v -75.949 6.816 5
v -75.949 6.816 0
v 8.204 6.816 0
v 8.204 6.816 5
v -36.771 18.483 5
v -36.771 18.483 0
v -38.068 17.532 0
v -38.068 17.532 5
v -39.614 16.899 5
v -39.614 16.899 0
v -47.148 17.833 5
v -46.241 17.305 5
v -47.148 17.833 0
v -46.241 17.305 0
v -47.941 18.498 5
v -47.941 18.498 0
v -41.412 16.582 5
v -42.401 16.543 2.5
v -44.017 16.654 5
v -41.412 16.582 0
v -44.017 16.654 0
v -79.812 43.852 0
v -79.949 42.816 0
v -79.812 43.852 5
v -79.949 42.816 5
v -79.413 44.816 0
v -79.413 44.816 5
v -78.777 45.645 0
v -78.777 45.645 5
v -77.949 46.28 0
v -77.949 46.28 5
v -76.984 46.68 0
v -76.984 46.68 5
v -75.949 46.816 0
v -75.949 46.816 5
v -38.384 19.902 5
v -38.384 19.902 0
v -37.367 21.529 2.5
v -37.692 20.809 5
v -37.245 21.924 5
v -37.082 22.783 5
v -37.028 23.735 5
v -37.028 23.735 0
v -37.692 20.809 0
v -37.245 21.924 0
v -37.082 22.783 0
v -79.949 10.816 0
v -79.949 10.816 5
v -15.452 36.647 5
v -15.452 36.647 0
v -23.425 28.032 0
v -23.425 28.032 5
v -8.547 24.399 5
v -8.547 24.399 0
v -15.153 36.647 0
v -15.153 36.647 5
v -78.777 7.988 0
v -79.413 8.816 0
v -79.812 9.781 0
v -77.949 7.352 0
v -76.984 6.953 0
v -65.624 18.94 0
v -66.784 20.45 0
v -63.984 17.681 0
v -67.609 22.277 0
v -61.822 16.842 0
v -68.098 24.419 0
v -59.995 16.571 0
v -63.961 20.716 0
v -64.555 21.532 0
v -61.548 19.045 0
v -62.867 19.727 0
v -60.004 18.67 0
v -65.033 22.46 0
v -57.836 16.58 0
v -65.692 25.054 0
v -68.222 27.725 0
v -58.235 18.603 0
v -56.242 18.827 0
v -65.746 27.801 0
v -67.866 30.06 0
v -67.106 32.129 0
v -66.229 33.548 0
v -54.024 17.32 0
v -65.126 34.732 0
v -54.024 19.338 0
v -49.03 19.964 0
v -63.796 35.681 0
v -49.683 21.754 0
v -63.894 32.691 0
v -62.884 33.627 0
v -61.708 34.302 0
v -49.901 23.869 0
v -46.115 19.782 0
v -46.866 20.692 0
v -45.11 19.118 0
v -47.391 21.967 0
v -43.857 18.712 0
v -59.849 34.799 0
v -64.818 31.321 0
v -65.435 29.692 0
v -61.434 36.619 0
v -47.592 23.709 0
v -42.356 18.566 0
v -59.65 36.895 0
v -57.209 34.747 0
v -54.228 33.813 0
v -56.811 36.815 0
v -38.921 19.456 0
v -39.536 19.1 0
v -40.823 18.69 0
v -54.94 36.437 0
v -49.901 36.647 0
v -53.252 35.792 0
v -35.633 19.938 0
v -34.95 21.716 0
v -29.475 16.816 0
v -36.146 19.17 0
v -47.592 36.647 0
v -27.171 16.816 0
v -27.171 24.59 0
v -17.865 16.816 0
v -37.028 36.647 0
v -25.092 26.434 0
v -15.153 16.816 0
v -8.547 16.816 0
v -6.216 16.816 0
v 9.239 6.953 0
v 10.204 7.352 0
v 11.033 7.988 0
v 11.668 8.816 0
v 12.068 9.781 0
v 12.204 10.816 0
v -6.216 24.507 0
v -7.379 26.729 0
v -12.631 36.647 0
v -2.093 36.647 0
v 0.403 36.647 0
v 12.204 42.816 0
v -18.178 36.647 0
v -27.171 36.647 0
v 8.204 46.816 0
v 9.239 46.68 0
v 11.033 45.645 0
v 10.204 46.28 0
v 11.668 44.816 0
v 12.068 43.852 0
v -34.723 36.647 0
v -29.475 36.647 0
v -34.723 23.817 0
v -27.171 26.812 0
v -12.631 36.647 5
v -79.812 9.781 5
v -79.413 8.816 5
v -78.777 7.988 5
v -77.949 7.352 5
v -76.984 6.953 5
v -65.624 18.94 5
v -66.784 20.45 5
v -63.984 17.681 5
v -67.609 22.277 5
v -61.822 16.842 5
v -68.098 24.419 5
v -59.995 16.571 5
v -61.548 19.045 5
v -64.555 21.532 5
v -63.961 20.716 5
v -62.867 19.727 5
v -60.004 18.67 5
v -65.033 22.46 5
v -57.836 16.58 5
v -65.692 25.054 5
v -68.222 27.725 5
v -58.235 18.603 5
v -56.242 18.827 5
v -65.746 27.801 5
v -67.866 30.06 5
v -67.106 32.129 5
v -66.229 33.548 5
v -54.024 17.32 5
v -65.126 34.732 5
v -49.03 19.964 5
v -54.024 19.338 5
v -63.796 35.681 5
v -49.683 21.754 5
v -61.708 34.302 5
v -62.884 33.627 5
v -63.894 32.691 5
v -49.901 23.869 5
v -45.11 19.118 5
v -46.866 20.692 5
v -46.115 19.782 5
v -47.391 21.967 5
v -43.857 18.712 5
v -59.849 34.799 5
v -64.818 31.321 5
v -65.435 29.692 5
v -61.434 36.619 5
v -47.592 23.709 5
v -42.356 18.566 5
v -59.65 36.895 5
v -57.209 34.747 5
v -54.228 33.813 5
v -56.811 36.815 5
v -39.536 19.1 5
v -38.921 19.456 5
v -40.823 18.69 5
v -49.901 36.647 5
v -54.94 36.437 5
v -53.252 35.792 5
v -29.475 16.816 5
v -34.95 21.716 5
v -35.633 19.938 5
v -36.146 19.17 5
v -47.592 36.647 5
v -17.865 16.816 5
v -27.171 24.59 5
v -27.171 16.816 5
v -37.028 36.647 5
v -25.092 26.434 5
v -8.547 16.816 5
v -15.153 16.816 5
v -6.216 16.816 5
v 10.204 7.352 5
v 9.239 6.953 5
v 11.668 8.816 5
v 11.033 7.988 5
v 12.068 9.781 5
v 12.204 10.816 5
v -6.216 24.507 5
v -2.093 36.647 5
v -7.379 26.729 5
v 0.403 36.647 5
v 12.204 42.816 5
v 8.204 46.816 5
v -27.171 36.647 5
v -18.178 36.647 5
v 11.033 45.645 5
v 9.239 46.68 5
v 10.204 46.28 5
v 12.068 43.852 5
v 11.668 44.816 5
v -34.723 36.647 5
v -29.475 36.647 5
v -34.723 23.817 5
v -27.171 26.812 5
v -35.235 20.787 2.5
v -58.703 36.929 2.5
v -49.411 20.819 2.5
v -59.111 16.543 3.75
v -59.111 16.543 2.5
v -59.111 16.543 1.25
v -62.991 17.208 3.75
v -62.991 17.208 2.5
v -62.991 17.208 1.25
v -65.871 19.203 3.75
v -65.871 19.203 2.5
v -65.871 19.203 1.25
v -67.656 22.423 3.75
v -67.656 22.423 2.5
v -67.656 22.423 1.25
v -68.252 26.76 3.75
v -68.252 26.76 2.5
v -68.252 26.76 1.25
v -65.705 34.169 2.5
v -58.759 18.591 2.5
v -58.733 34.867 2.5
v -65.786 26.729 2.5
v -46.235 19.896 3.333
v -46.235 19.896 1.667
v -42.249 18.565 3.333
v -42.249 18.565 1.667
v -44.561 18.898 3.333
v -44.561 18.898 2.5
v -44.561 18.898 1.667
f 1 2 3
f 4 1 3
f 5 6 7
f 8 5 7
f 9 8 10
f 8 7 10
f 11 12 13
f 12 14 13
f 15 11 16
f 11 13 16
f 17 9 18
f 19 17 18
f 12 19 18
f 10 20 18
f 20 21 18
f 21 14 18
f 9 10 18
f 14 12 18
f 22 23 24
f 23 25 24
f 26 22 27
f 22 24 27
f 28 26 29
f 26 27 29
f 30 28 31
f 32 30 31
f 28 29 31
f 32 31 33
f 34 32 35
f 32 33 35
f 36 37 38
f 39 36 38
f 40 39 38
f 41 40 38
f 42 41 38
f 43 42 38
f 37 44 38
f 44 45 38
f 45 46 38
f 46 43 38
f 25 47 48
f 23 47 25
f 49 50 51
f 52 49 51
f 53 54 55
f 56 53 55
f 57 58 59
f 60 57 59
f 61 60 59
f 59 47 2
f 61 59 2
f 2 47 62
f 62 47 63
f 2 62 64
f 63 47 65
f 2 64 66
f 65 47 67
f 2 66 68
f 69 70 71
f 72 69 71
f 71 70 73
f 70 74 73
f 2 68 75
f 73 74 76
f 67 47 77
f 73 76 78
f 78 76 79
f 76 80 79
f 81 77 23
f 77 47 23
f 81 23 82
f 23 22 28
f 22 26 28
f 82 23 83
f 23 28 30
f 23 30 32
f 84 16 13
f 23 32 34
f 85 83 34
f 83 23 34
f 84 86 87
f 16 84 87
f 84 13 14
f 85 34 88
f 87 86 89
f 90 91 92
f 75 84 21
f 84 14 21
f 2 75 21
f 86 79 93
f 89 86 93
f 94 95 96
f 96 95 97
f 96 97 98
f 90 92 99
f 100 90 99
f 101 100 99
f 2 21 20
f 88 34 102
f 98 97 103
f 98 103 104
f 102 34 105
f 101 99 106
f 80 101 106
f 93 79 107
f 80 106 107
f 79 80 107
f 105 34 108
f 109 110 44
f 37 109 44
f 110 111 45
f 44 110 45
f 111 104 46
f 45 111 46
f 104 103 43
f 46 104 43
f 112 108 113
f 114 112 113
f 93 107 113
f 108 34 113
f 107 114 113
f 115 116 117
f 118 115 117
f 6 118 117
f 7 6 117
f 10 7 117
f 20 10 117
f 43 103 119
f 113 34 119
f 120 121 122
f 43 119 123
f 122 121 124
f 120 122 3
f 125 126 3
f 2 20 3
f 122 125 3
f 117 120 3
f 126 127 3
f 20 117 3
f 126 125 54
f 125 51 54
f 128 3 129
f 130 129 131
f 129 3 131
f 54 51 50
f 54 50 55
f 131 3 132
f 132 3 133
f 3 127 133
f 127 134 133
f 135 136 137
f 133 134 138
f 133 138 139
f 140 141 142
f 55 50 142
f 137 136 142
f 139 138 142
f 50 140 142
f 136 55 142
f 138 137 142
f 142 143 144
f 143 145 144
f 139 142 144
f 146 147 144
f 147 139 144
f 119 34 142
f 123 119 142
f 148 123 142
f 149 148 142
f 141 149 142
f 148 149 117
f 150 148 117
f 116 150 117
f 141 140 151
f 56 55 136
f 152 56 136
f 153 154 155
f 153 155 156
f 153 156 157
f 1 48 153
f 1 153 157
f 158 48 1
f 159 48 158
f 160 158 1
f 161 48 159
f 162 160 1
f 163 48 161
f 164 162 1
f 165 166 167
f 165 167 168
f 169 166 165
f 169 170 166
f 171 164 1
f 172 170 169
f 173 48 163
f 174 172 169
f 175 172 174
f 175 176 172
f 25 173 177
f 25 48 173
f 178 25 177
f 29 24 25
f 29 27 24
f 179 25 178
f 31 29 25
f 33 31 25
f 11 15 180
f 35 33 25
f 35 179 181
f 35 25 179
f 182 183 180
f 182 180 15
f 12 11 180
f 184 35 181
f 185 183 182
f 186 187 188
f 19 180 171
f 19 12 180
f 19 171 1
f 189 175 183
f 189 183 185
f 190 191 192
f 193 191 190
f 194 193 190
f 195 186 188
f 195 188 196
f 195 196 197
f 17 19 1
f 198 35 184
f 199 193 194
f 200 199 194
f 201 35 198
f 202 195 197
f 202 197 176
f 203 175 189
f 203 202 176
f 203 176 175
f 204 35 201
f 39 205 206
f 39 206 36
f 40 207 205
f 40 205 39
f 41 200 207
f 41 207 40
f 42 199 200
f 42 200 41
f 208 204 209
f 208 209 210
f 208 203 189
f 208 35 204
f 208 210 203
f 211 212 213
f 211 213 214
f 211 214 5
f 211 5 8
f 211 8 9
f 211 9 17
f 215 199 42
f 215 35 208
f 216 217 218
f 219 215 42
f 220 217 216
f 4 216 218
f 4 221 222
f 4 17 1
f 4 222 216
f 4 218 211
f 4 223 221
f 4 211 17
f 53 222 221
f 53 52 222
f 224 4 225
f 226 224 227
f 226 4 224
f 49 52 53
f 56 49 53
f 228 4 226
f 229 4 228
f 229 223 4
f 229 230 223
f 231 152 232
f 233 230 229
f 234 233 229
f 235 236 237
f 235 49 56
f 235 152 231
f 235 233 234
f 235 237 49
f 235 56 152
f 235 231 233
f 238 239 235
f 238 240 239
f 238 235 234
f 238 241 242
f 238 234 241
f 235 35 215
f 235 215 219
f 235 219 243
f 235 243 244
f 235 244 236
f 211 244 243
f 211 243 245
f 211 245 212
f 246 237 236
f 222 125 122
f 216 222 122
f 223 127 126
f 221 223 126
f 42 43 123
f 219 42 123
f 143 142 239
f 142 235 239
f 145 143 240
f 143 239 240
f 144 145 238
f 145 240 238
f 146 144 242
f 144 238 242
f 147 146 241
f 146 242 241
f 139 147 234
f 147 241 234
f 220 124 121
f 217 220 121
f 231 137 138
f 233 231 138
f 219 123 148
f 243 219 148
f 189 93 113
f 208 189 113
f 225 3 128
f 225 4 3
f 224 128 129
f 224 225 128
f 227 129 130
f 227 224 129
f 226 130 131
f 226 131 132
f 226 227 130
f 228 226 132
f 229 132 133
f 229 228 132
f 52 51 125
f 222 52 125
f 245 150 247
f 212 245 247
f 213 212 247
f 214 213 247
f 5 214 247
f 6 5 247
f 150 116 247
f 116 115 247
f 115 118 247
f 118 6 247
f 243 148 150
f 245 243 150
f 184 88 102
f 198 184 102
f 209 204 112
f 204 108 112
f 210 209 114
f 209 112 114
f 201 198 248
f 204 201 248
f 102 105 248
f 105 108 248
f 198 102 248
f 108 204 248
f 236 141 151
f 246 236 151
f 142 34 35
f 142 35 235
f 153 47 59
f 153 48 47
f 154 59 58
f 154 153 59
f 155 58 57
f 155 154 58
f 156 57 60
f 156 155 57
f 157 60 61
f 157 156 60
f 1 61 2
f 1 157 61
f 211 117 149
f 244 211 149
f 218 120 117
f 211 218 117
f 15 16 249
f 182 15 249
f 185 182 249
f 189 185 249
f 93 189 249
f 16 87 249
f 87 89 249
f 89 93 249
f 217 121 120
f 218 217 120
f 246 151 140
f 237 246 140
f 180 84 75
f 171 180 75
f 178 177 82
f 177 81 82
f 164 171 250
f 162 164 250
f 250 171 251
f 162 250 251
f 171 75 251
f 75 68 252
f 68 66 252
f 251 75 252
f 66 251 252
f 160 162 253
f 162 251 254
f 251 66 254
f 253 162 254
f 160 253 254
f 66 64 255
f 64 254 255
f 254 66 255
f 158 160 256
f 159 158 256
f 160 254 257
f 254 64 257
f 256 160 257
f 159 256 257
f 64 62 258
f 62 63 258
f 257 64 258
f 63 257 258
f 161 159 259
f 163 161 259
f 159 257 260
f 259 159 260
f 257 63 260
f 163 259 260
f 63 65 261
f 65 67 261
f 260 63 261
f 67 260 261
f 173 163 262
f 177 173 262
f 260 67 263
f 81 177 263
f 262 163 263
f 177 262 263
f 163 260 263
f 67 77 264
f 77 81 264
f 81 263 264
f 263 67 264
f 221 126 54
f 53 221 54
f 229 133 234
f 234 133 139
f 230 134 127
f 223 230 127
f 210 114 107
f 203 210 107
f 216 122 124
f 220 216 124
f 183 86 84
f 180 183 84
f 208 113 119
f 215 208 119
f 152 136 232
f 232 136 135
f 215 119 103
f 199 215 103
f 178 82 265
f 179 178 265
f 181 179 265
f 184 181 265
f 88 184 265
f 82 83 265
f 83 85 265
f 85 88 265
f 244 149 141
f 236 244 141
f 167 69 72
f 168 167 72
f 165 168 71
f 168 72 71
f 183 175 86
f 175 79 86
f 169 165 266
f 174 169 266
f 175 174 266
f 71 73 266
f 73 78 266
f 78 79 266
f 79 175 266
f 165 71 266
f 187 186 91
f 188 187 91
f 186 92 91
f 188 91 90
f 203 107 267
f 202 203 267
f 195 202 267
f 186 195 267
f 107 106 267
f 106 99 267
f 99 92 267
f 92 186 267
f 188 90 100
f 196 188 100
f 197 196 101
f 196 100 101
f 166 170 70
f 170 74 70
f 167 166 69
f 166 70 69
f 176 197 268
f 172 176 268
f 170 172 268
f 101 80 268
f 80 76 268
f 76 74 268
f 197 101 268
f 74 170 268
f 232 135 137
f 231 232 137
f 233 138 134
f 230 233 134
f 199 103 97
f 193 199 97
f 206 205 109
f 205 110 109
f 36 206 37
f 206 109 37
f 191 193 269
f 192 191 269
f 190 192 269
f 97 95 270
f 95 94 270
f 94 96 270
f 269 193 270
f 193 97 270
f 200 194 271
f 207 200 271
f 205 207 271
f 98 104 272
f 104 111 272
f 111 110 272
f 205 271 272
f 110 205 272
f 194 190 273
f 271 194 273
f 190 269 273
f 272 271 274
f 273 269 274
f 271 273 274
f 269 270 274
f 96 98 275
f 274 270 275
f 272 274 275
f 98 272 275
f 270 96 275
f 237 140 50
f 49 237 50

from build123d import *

# Parameters (mm, degrees)
F0_W     = 92.1527777778
F0_H     = 40
F1_DEPTH = 5
F2_R     = 4


with BuildPart() as f1:
    # F0 (on Top) → F1 (new body)
    with BuildSketch(Plane.XY):
        with Locations((-33.8721656561, 26.8162500644)):
            Rectangle(F0_W, F0_H)
        with BuildLine():
            add(Edge.make_bspline(
                [(-54.2280684339, 33.8127778422), (-56.4806726005, 34.8674653422), (-58.7332767672, 34.8674653422)],
                knots=[0, 0, 0, 1, 1, 1], degree=2))
            add(Edge.make_bspline(
                [(-58.7332767672, 34.8674653422), (-62.0015059339, 34.8674653422), (-63.893867045, 32.6908160367)],
                knots=[0, 0, 0, 1, 1, 1], degree=2))
            add(Edge.make_bspline(
                [(-63.893867045, 32.6908160367), (-65.7862281561, 30.5141667311), (-65.7862281561, 26.7294445089)],
                knots=[0, 0, 0, 1, 1, 1], degree=2))
            add(Edge.make_bspline(
                [(-65.7862281561, 26.7294445089), (-65.7862281561, 22.84055562), (-63.9611413505, 20.7159896478)],
                knots=[0, 0, 0, 1, 1, 1], degree=2))
            add(Edge.make_bspline(
                [(-63.9611413505, 20.7159896478), (-62.136054545, 18.5914236756), (-58.7593184339, 18.5914236756)],
                knots=[0, 0, 0, 1, 1, 1], degree=2))
            add(Edge.make_bspline(
                [(-58.7593184339, 18.5914236756), (-56.6846656561, 18.5914236756), (-54.0240753783, 19.3379514533)],
                knots=[0, 0, 0, 1, 1, 1], degree=2))
            Line((-54.0240753783, 19.3379514533), (-54.0240753783, 17.3197222867))
            add(Edge.make_bspline(
                [(-54.0240753783, 17.3197222867), (-56.0857073228, 16.5428125644), (-59.1108809339, 16.5428125644)],
                knots=[0, 0, 0, 1, 1, 1], degree=2))
            add(Edge.make_bspline(
                [(-59.1108809339, 16.5428125644), (-63.4902212117, 16.5428125644), (-65.8708635728, 19.2034028422)],
                knots=[0, 0, 0, 1, 1, 1], degree=2))
            add(Edge.make_bspline(
                [(-65.8708635728, 19.2034028422), (-68.2515059339, 21.86399312), (-68.2515059339, 26.7598264533)],
                knots=[0, 0, 0, 1, 1, 1], degree=2))
            add(Edge.make_bspline(
                [(-68.2515059339, 26.7598264533), (-68.2515059339, 29.8240625644), (-67.1056726005, 32.1287500644)],
                knots=[0, 0, 0, 1, 1, 1], degree=2))
            add(Edge.make_bspline(
                [(-67.1056726005, 32.1287500644), (-65.9598392672, 34.4334375644), (-63.796210795, 35.6812674256)],
                knots=[0, 0, 0, 1, 1, 1], degree=2))
            add(Edge.make_bspline(
                [(-63.796210795, 35.6812674256), (-61.6325823228, 36.9290972867), (-58.7028948228, 36.9290972867)],
                knots=[0, 0, 0, 1, 1, 1], degree=2))
            add(Edge.make_bspline(
                [(-58.7028948228, 36.9290972867), (-55.5865753783, 36.9290972867), (-53.2515059339, 35.7919445089)],
                knots=[0, 0, 0, 1, 1, 1], degree=2))
            Line((-53.2515059339, 35.7919445089), (-54.2280684339, 33.8127778422))
        make_face(mode=Mode.SUBTRACT)
        with BuildLine():
            Line((-37.0275476005, 36.6469792311), (-34.7228601005, 36.6469792311))
            Line((-34.7228601005, 36.6469792311), (-34.7228601005, 23.81711812))
            add(Edge.make_bspline(
                [(-34.7228601005, 23.81711812), (-34.7228601005, 20.4230208978), (-36.7714712117, 18.4829167311)],
                knots=[0, 0, 0, 1, 1, 1], degree=2))
            add(Edge.make_bspline(
                [(-36.7714712117, 18.4829167311), (-38.8200823228, 16.5428125644), (-42.4008114894, 16.5428125644)],
                knots=[0, 0, 0, 1, 1, 1], degree=2))
            add(Edge.make_bspline(
                [(-42.4008114894, 16.5428125644), (-45.9815406561, 16.5428125644), (-47.9411760728, 18.4981077033)],
                knots=[0, 0, 0, 1, 1, 1], degree=2))
            add(Edge.make_bspline(
                [(-47.9411760728, 18.4981077033), (-49.9008114894, 20.4534028422), (-49.9008114894, 23.8692014533)],
                knots=[0, 0, 0, 1, 1, 1], degree=2))
            Line((-49.9008114894, 23.8692014533), (-49.9008114894, 36.6469792311))
            Line((-49.9008114894, 36.6469792311), (-47.5917837117, 36.6469792311))
            Line((-47.5917837117, 36.6469792311), (-47.5917837117, 23.7086111756))
            add(Edge.make_bspline(
                [(-47.5917837117, 23.7086111756), (-47.5917837117, 21.2259722867), (-46.2354469061, 19.8956771478)],
                knots=[0, 0, 0, 1, 1, 1], degree=2))
            add(Edge.make_bspline(
                [(-46.2354469061, 19.8956771478), (-44.8791101005, 18.5653820089), (-42.2489017672, 18.5653820089)],
                knots=[0, 0, 0, 1, 1, 1], degree=2))
            add(Edge.make_bspline(
                [(-42.2489017672, 18.5653820089), (-39.7402212117, 18.5653820089), (-38.3838844061, 19.9021875644)],
                knots=[0, 0, 0, 1, 1, 1], degree=2))
            add(Edge.make_bspline(
                [(-38.3838844061, 19.9021875644), (-37.0275476005, 21.23899312), (-37.0275476005, 23.7346528422)],
                knots=[0, 0, 0, 1, 1, 1], degree=2))
            Line((-37.0275476005, 23.7346528422), (-37.0275476005, 36.6469792311))
        make_face(mode=Mode.SUBTRACT)
        Polygon((-23.425117045, 28.0315278422), (-15.1525476005, 16.8162500644), (-17.8652212117, 16.8162500644), (-25.0917837117, 26.43430562), (-27.1707767672, 24.5896875644), (-27.1707767672, 16.8162500644), (-29.4754642672, 16.8162500644), (-29.4754642672, 36.6469792311), (-27.1707767672, 36.6469792311), (-27.1707767672, 26.8119097867), (-18.1777212117, 36.6469792311), (-15.4520267672, 36.6469792311), align=None, mode=Mode.SUBTRACT)
        Polygon((-12.6308462117, 36.6469792311), (-7.3791101005, 26.7294445089), (-2.0926517672, 36.6469792311), (0.403007955, 36.6469792311), (-6.2159156561, 24.5072222867), (-6.2159156561, 16.8162500644), (-8.5466448228, 16.8162500644), (-8.5466448228, 24.3987153422), (-15.1525476005, 36.6469792311), align=None, mode=Mode.SUBTRACT)
    extrude(amount=F1_DEPTH)

    # F2
    f2_edges = [f1.edges().sort_by_distance(p)[0] for p in [
        (-79.948555, 46.81625, 2.5),
        (-79.948555, 6.81625, 2.5),
        (12.204223, 6.81625, 2.5),
        (12.204223, 46.81625, 2.5),
    ]]
    fillet(f2_edges, radius=F2_R)


solid = f1.part
